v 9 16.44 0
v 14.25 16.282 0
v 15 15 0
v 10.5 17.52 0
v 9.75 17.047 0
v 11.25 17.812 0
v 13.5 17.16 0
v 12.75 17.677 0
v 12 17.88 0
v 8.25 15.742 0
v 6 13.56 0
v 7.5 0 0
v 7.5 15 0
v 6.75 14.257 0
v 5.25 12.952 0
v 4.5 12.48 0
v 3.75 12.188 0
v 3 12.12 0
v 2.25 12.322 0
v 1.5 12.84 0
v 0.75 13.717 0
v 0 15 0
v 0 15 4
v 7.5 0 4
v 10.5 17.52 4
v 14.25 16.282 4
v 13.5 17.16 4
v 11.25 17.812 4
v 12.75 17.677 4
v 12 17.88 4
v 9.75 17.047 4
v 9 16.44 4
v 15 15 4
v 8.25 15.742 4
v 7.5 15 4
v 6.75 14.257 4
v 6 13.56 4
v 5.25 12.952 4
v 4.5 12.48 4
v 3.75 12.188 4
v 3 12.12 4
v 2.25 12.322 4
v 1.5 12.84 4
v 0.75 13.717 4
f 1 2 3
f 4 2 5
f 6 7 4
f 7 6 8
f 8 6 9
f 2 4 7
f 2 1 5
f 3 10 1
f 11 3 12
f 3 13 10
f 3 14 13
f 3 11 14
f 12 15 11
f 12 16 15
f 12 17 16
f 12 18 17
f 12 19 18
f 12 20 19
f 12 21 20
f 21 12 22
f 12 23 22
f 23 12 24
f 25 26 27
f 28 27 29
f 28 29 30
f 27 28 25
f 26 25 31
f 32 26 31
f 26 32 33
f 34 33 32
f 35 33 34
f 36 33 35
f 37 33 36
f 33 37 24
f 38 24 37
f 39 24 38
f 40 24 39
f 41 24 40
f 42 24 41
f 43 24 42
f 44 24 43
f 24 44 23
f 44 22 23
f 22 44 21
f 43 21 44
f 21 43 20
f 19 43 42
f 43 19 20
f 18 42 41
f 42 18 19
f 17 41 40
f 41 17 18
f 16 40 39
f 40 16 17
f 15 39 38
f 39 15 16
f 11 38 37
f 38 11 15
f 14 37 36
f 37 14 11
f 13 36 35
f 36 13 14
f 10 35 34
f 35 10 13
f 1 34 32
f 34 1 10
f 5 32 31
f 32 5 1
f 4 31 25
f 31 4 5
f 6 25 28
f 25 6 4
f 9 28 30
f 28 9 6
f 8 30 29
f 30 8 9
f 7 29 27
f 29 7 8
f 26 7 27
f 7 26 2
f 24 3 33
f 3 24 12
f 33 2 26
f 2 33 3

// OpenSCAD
//
// Credit: http://www.thingiverse.com/thing:8443/#files
//

joinfactor = 0.125;

gFocalPoint = [0,0];
gSteps = 20;
gHeight = 4;

BezQuadCurve( [[0, 15],[5,5],[10,25],[15,15]], [7.5, 0], gSteps, gHeight);

//=======================================
// Functions
//=======================================
function BEZ03(u) = pow((1-u), 3);
function BEZ13(u) = 3*u*(pow((1-u),2));
function BEZ23(u) = 3*(pow(u,2))*(1-u);
function BEZ33(u) = pow(u,3);

function PointAlongBez4(p0, p1, p2, p3, u) = [
	BEZ03(u)*p0[0]+BEZ13(u)*p1[0]+BEZ23(u)*p2[0]+BEZ33(u)*p3[0],
	BEZ03(u)*p0[1]+BEZ13(u)*p1[1]+BEZ23(u)*p2[1]+BEZ33(u)*p3[1]];

//=======================================
// Modules
//=======================================
// c - ControlPoints
module BezQuadCurve(c, focalPoint, steps=gSteps, height=gHeight, showPoints)
{
    if (showPoints) {
        // Draw control points
        for(point=[0:3])
        {
            translate(c[point])
            color([1,0,0])
            cylinder(r=1, h=height+joinfactor);
        }
    }

	for(step = [1:steps])
	{
		linear_extrude(height = height, convexity = 10) 
		polygon(
			points=[
				focalPoint,
				PointAlongBez4(c[0], c[1], c[2],c[3], step/steps),
				PointAlongBez4(c[0], c[1], c[2],c[3], (step-1)/steps)],
			paths=[[0,1,2,0]]
		);
	}
}

//==============================================
// Test functions
//==============================================
//PlotBEZ0(100);
//PlotBEZ1(100);
//PlotBEZ2(100);
//PlotBEZ3(100);
//PlotBez4Blending();


module PlotBEZ0(steps)
{
	cubeSize = 1;
	cubeHeight = steps;

	for (step=[0:steps])
	{
		translate([cubeSize*step, 0, 0])
		cube(size=[cubeSize, cubeSize, BEZ03(step/steps)*cubeHeight]);
	}	
}

module PlotBEZ1(steps)
{
	cubeSize = 1;
	cubeHeight = steps;

	for (step=[0:steps])
	{
		translate([cubeSize*step, 0, 0])
		cube(size=[cubeSize, cubeSize, BEZ13(step/steps)*cubeHeight]);
	}	
}

module PlotBEZ2(steps)
{
	cubeSize = 1;
	cubeHeight = steps;

	for (step=[0:steps])
	{
		translate([cubeSize*step, 0, 0])
		cube(size=[cubeSize, cubeSize, BEZ23(step/steps)*cubeHeight]);
	}	
}

module PlotBEZ3(steps)
{
	cubeSize = 1;
	cubeHeight = steps;

	for (step=[0:steps])
	{
		translate([cubeSize*step, 0, 0])
		cube(size=[cubeSize, cubeSize, BEZ33(step/steps)*cubeHeight]);
	}	
}

module PlotBez4Blending()
{
	sizing = 100;

	translate([0, 0, sizing + 10])
	PlotBEZ0(100);

	translate([sizing+10, 0, sizing + 10])
	PlotBEZ1(100);

	translate([0, 0, 0])
	PlotBEZ2(100);

	translate([sizing+10, 0, 0])
	PlotBEZ3(100);
}
